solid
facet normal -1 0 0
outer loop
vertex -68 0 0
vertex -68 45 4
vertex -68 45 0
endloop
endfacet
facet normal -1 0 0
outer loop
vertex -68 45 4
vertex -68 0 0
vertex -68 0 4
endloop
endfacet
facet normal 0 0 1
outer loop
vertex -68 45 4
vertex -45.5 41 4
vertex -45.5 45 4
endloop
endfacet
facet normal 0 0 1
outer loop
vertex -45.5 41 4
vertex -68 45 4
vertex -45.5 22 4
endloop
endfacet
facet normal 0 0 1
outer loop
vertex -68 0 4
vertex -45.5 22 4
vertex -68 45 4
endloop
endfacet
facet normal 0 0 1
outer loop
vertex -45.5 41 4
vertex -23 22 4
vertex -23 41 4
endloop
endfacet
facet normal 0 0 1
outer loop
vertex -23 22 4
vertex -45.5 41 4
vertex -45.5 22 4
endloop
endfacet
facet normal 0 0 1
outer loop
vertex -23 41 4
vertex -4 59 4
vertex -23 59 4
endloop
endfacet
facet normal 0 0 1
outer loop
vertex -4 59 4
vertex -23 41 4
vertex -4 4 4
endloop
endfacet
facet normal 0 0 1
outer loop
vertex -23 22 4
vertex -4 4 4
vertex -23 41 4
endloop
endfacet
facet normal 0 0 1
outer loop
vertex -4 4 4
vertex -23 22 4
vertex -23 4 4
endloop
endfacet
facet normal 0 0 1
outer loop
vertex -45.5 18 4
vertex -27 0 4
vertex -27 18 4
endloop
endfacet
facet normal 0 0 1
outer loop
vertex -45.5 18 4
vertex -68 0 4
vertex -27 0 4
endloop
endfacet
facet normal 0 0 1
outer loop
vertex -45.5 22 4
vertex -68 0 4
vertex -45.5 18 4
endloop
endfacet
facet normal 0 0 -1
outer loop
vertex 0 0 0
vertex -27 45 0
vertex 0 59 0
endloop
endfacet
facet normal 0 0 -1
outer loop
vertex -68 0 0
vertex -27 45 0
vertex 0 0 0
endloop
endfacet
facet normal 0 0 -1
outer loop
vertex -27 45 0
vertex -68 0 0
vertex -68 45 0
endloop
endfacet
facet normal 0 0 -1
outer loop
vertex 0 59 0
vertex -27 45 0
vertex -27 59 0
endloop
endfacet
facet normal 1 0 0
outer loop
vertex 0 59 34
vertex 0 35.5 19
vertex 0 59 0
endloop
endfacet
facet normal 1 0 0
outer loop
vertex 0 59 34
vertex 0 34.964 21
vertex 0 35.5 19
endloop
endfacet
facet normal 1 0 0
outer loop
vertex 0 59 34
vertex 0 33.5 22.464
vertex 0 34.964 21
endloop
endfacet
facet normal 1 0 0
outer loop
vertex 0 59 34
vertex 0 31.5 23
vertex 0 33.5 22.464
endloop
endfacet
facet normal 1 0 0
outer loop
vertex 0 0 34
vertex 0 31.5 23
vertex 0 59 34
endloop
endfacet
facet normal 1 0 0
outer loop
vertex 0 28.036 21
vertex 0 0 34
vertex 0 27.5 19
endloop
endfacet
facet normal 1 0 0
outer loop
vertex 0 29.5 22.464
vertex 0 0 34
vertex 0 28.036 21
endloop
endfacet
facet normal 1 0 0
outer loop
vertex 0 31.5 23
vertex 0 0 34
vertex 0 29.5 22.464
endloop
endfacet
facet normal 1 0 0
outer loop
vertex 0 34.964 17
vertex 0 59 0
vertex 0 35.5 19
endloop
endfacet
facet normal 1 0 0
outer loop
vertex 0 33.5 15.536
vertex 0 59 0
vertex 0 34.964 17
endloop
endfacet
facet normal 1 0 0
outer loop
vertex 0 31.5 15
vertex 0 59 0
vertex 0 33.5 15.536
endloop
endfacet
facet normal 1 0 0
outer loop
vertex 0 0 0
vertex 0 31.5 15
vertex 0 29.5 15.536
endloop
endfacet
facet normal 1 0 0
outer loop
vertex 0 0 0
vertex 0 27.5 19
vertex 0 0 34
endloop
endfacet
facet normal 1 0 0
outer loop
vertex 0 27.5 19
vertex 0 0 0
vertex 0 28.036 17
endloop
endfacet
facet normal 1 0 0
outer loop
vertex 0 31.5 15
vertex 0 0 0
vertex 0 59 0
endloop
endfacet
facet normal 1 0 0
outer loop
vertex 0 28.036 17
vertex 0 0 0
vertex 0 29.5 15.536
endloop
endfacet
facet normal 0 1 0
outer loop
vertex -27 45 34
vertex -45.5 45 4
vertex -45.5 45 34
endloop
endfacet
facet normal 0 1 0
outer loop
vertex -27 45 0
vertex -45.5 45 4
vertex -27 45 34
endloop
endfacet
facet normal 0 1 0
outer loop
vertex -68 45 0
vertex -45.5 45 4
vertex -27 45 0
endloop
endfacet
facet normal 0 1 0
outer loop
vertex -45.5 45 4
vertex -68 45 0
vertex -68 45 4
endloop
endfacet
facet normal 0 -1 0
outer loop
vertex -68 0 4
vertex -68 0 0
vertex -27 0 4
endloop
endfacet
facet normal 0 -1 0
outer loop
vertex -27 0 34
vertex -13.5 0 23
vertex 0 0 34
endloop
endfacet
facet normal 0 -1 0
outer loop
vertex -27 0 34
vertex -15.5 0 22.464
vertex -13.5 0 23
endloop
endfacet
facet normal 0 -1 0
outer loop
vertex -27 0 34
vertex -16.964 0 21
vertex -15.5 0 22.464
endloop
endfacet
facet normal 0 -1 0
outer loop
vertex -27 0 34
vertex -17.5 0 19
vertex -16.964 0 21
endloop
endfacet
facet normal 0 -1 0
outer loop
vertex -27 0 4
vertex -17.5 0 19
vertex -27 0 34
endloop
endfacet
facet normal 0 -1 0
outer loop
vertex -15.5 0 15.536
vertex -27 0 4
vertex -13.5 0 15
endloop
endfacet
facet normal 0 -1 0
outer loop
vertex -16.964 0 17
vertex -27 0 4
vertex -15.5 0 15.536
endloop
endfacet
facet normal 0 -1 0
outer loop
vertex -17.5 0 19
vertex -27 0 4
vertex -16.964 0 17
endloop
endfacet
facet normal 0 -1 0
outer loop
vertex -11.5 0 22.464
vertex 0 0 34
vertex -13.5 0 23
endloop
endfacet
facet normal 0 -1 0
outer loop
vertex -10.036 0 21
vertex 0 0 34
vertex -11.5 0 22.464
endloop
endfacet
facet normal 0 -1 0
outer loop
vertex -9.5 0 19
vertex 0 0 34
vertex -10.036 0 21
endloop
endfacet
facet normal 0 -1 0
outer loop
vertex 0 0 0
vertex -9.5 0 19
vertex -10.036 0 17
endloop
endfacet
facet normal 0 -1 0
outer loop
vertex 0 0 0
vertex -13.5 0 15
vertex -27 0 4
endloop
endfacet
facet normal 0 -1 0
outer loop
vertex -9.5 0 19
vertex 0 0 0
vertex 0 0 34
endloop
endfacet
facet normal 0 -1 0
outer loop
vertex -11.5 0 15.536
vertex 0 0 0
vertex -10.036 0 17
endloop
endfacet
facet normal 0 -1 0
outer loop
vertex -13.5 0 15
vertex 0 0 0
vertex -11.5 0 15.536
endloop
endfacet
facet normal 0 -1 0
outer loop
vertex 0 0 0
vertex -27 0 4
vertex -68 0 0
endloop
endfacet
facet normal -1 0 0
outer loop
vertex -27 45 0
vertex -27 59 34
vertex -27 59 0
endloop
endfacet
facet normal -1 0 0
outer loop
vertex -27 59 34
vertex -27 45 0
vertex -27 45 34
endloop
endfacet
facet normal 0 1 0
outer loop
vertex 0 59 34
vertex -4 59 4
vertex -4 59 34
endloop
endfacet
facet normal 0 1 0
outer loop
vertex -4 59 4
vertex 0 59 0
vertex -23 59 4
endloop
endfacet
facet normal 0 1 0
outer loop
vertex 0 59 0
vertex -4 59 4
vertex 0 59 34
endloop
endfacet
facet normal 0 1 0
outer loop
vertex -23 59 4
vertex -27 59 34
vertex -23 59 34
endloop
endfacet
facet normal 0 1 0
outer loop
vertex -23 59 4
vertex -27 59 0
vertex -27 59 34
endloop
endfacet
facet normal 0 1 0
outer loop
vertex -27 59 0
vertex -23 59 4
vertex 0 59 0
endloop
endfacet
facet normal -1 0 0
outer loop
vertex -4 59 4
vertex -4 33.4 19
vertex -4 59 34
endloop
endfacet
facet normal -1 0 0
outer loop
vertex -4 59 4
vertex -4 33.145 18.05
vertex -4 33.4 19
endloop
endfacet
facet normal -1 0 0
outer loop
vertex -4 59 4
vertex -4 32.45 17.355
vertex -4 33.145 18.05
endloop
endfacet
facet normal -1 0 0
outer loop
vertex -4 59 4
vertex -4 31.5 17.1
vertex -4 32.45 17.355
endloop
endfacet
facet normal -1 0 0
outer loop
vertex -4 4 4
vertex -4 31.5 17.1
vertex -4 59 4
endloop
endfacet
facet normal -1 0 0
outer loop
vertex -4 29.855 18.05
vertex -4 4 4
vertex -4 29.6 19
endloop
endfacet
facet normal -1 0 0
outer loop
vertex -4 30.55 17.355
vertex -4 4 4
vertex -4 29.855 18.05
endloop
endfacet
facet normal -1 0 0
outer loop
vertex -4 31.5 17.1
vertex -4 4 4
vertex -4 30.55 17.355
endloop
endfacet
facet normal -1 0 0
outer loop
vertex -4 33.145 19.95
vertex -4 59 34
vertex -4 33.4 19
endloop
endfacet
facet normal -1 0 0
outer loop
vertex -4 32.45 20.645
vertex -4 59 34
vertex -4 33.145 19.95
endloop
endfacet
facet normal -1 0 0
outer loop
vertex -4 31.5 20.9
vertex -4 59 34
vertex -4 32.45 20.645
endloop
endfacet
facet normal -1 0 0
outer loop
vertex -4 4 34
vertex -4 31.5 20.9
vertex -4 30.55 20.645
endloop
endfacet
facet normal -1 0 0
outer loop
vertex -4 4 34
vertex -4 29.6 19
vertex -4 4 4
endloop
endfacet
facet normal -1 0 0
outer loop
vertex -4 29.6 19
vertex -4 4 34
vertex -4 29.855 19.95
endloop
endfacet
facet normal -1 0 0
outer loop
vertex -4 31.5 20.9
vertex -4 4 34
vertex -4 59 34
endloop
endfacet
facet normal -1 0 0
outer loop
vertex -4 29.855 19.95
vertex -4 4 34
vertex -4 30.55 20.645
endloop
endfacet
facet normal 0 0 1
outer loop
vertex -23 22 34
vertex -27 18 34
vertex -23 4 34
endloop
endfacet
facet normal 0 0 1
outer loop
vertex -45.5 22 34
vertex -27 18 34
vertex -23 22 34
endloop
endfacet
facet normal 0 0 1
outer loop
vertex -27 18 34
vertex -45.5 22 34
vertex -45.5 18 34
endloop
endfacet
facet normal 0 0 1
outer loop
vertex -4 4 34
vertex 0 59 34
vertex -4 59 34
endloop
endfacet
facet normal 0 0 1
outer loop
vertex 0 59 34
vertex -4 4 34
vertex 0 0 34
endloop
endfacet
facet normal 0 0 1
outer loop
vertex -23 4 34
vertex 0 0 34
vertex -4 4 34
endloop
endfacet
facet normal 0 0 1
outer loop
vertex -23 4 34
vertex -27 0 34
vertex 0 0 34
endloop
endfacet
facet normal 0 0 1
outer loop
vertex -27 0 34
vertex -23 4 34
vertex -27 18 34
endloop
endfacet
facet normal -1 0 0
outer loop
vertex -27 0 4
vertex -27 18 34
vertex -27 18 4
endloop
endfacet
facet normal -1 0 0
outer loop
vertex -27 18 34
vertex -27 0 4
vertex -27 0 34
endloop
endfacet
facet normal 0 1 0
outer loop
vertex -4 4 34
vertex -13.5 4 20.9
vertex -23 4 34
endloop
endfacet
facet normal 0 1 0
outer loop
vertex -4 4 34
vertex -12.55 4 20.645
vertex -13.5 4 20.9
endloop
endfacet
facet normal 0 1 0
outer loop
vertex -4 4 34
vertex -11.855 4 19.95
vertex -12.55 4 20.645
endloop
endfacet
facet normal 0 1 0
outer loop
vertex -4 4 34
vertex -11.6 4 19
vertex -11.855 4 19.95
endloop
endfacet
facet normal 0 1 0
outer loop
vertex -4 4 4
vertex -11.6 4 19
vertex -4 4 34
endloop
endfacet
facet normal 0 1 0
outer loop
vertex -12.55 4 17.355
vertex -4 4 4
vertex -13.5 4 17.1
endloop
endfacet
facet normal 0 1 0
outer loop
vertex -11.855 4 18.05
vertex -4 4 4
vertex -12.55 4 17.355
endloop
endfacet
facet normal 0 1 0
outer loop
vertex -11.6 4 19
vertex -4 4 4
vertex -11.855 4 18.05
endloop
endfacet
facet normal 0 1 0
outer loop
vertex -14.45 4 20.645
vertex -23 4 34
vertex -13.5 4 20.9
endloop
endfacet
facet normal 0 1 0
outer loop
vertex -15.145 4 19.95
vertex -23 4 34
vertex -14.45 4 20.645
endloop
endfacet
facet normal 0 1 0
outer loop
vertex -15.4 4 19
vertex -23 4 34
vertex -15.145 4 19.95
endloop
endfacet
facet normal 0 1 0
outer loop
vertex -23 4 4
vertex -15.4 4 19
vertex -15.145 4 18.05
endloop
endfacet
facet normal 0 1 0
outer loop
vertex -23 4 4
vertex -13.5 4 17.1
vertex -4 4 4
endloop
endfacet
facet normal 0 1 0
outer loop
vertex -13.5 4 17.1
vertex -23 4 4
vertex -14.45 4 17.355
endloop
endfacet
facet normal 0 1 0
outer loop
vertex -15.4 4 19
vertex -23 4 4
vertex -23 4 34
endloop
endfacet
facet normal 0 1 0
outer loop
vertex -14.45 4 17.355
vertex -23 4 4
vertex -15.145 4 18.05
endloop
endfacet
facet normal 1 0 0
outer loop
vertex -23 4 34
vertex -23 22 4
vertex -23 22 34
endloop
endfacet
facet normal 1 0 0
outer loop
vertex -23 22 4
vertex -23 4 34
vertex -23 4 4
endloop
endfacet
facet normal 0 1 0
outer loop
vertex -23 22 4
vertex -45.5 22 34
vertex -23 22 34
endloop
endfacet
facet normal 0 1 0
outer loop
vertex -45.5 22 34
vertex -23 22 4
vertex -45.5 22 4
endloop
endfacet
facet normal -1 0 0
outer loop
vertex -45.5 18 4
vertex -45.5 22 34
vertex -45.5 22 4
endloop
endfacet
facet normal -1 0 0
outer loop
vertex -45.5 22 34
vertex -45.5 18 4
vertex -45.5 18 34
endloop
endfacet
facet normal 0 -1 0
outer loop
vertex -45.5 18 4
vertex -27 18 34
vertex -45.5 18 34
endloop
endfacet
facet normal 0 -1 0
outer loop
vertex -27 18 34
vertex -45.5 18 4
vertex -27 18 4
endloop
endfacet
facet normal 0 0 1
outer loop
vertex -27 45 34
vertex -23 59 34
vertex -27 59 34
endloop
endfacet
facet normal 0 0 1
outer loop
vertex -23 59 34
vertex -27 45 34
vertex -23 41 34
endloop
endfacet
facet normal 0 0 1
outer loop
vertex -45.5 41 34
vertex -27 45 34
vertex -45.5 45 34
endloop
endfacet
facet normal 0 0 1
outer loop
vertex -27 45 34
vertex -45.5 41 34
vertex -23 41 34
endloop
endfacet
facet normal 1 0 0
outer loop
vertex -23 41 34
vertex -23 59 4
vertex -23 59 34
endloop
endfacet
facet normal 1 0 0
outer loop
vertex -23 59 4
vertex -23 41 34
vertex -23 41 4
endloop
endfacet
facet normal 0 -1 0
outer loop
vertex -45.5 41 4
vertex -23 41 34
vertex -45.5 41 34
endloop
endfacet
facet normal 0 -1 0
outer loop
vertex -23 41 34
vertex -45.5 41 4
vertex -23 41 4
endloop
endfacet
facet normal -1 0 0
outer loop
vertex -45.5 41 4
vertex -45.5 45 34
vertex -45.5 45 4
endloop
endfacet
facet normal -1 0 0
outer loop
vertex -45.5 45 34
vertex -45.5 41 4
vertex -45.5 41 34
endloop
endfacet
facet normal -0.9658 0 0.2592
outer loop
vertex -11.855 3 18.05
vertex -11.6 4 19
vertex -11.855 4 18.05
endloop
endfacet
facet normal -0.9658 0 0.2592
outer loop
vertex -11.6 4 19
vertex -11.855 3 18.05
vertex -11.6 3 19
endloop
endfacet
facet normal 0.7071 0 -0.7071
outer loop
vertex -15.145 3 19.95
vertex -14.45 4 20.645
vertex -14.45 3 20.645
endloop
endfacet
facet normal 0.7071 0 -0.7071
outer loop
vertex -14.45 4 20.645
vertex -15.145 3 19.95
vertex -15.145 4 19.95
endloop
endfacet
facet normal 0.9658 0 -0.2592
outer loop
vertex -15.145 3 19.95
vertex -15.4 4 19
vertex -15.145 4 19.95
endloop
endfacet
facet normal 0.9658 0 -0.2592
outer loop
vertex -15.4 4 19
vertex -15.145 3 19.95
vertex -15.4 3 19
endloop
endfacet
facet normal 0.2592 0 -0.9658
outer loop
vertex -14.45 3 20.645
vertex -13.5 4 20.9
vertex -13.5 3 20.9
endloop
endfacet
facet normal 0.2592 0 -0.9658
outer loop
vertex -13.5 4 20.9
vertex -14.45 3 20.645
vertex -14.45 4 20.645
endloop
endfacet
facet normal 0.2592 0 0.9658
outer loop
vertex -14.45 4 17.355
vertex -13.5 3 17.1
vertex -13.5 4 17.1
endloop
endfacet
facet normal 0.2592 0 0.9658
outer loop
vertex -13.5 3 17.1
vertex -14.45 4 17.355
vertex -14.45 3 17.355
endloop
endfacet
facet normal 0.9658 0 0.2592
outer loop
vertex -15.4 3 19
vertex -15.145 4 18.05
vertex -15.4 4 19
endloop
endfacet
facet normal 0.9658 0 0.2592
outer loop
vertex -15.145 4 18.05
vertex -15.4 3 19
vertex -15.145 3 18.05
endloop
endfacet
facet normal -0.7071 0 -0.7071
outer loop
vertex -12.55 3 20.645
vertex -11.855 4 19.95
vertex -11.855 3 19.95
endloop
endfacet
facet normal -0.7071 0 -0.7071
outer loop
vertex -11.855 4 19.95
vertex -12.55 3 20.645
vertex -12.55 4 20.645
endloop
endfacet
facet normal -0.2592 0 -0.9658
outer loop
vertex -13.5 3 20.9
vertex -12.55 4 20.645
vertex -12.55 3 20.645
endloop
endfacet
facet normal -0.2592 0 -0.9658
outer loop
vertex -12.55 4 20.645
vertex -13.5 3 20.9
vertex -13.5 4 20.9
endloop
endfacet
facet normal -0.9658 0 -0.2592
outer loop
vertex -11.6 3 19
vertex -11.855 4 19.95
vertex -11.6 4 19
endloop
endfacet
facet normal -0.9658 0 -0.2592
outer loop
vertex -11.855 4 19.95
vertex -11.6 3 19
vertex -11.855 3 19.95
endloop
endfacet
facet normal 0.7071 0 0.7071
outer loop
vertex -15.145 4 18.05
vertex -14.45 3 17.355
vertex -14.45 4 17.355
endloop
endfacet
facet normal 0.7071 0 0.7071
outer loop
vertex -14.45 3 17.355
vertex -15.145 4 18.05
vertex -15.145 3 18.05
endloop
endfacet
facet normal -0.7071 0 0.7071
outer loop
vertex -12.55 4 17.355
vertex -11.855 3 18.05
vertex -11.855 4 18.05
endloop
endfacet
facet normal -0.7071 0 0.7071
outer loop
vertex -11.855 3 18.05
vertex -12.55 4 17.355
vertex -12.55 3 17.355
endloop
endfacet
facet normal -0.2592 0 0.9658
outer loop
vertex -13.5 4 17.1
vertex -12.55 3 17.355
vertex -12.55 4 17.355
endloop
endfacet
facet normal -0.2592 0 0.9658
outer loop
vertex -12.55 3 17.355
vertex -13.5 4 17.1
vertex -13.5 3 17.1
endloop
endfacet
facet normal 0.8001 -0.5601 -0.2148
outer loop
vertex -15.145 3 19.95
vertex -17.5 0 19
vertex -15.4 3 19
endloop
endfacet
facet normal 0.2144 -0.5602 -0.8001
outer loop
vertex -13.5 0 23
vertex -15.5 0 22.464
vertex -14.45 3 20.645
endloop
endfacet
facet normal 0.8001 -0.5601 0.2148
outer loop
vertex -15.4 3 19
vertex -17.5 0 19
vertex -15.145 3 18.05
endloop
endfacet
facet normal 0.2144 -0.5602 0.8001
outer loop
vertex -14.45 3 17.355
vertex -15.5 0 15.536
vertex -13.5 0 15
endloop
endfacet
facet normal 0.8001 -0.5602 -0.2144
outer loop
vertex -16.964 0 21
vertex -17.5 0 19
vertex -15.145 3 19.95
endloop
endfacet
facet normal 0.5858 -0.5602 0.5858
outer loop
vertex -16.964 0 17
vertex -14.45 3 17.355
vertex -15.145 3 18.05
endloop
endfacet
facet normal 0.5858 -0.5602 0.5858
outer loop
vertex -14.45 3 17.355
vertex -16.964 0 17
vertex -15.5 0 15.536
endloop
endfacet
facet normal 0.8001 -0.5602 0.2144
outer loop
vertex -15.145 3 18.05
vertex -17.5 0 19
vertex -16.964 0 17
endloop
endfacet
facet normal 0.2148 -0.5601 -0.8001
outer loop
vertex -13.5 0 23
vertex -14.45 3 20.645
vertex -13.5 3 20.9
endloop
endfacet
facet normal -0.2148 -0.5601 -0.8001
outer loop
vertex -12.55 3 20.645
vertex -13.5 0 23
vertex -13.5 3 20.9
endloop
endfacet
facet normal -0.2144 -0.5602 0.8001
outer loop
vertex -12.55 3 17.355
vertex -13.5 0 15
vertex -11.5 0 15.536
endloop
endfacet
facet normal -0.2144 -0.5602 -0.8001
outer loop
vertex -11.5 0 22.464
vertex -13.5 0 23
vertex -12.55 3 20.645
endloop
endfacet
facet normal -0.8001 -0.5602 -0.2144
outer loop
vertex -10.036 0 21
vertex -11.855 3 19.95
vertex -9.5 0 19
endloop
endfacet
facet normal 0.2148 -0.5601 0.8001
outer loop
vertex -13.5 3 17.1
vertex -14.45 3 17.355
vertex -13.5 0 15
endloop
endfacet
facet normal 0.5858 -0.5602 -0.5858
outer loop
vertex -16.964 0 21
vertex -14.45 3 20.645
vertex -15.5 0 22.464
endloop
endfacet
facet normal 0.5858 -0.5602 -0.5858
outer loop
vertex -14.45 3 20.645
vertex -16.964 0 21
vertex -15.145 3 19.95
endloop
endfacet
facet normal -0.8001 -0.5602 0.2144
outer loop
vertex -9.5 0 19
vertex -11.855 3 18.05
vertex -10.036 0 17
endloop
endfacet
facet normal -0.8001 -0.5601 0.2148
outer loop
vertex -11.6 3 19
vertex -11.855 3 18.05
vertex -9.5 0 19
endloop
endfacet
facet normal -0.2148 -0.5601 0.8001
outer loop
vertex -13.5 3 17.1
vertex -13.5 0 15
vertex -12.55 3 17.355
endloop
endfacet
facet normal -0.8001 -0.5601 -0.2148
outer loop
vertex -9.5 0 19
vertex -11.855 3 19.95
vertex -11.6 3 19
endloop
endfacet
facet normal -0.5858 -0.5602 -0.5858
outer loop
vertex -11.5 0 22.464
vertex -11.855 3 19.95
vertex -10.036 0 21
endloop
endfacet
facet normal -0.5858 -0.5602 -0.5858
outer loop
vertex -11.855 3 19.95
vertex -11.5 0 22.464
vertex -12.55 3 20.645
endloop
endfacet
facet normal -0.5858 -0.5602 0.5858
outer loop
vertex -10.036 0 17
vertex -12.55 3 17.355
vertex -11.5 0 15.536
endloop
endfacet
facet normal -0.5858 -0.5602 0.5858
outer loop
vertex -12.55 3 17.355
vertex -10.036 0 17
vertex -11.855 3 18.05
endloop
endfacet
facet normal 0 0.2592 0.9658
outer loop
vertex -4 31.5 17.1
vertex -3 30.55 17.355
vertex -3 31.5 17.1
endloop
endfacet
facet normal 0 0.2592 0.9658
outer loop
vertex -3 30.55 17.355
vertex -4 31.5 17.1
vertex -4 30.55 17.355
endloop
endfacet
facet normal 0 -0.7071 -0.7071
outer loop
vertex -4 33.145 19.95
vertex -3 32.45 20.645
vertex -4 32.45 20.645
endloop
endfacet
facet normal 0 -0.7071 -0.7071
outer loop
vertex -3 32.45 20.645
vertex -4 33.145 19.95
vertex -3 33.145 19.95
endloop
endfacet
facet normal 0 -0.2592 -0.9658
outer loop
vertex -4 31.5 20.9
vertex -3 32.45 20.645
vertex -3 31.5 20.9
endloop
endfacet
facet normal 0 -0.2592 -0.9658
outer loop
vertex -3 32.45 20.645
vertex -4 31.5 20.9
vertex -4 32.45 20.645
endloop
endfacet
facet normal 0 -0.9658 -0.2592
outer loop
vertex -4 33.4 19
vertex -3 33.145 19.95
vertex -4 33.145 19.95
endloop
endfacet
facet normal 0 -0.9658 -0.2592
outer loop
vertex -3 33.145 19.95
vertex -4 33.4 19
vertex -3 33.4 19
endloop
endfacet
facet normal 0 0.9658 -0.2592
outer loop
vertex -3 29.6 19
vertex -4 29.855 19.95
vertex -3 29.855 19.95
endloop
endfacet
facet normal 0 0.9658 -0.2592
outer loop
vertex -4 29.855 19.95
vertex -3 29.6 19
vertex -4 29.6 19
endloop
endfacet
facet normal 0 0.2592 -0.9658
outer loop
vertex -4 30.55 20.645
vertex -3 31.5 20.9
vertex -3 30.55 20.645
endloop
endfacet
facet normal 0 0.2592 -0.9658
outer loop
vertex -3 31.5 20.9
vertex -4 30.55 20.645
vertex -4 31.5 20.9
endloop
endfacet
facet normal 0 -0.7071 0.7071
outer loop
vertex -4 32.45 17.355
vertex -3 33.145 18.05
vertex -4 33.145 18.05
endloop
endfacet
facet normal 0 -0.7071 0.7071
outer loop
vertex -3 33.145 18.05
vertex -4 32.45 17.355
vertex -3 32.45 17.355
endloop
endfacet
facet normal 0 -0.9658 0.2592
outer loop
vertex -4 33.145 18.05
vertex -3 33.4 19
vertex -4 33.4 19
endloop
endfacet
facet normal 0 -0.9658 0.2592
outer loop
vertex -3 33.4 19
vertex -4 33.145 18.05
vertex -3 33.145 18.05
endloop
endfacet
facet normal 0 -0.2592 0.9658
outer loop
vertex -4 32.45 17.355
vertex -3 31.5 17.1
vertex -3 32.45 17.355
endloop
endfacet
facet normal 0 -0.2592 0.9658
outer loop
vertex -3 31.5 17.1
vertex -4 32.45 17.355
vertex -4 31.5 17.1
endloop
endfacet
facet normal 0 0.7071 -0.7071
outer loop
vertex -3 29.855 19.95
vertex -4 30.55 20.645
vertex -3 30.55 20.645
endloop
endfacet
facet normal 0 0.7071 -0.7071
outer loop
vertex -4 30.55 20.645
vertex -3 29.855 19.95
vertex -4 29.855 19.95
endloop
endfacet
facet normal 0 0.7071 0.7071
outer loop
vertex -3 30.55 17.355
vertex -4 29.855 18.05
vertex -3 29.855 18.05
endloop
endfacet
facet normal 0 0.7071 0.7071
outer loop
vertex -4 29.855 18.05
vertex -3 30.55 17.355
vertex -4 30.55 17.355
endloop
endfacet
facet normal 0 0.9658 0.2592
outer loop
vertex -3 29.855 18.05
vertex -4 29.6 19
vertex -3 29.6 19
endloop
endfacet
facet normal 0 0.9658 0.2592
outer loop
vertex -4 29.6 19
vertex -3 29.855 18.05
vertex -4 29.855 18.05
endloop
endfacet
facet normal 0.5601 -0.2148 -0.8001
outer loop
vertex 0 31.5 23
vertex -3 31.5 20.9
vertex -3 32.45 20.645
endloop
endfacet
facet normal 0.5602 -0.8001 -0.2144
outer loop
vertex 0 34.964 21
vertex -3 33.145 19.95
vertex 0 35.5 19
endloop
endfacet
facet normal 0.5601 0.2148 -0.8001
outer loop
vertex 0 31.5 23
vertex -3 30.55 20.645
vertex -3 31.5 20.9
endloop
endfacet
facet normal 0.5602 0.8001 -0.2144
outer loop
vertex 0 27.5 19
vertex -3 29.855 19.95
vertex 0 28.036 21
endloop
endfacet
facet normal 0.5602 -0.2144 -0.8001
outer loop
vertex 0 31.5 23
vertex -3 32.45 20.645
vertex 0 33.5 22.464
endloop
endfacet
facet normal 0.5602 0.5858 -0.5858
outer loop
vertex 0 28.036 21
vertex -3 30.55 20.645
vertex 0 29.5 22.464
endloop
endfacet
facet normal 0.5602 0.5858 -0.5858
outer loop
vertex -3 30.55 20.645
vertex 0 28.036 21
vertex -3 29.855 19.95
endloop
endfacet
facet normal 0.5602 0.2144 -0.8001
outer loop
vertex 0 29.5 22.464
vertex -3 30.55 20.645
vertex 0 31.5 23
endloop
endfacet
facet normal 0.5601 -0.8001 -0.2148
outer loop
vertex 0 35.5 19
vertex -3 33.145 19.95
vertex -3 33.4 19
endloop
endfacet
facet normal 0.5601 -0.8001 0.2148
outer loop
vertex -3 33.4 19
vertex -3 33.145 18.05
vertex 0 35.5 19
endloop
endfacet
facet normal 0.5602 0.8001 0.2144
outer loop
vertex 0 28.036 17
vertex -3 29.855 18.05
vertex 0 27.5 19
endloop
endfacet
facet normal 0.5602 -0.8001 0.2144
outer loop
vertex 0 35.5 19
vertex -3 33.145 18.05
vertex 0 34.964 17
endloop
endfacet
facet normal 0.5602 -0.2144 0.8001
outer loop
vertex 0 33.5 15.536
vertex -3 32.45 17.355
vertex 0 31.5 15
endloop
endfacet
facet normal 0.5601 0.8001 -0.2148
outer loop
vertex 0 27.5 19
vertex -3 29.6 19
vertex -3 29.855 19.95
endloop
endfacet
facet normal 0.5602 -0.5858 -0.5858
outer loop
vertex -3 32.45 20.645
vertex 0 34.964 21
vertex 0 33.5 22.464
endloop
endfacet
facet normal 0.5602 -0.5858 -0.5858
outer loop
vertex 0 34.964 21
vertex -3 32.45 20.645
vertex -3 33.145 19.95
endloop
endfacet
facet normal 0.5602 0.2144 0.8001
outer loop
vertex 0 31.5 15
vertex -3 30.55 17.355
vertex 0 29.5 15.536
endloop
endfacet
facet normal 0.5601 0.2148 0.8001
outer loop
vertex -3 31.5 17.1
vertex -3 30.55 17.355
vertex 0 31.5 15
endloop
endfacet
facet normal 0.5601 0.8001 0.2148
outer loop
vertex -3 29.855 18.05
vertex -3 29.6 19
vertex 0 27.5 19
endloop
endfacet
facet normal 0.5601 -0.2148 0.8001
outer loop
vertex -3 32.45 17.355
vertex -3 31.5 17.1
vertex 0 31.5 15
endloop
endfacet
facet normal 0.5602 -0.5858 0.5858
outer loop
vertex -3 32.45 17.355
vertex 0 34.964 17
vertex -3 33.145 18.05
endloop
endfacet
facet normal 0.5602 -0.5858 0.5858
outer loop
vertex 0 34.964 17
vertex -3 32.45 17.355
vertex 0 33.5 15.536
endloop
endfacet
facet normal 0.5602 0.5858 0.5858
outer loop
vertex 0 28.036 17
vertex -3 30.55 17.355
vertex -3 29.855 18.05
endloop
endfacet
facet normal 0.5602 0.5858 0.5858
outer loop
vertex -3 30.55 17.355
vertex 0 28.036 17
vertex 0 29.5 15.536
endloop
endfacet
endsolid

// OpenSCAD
difference(){
	scale(v = [-1, 1, 1]) {
		union() {
			union() {
				cube(size = [68, 45, 4]);
				cube(size = [27, 59, 4]);
			}
			translate(v = [0, 0, 4]) {
				cube(size = [4, 59, 30]);
			}
			translate(v = [0, 0, 4]) {
				cube(size = [27, 4, 30]);
			}
			translate(v = [23, 0, 4]) {
				cube(size = [4, 22, 30]);
			}
			translate(v = [23, 18, 4]) {
				cube(size = [22.5000000000, 4, 30]);
			}
			translate(v = [23, 41, 4]) {
				cube(size = [4, 18, 30]);
			}
			translate(v = [23, 41, 4]) {
				cube(size = [22.5000000000, 4, 30]);
			}
		}
	}
	/* Holes Below*/
	scale(v = [-1, 1, 1]){
		union(){
			translate(v = [13.5000000000, 0, 19.0000000000]) {
				rotate(a = 90, v = [1, 0, 0]) {
					union() {
						union() {
							translate(v = [0, 0, -5]) {
								cylinder($fn = 12, h = 5, r = 1.9000000000);
							}
							translate(v = [0, 0, -3]) {
								cylinder($fn = 12, h = 3, r1 = 1.9000000000, r2 = 4);
							}
						}
						cylinder($fn = 12, h = 1, r = 4);
					}
				}
			}
			translate(v = [0, 31.5000000000, 19.0000000000]) {
				rotate(a = -90, v = [0, 1, 0]) {
					union() {
						union() {
							translate(v = [0, 0, -5]) {
								cylinder($fn = 12, h = 5, r = 1.9000000000);
							}
							translate(v = [0, 0, -3]) {
								cylinder($fn = 12, h = 3, r1 = 1.9000000000, r2 = 4);
							}
						}
						cylinder($fn = 12, h = 1, r = 4);
					}
				}
			}
		}
	} /* End Holes */ 
}
